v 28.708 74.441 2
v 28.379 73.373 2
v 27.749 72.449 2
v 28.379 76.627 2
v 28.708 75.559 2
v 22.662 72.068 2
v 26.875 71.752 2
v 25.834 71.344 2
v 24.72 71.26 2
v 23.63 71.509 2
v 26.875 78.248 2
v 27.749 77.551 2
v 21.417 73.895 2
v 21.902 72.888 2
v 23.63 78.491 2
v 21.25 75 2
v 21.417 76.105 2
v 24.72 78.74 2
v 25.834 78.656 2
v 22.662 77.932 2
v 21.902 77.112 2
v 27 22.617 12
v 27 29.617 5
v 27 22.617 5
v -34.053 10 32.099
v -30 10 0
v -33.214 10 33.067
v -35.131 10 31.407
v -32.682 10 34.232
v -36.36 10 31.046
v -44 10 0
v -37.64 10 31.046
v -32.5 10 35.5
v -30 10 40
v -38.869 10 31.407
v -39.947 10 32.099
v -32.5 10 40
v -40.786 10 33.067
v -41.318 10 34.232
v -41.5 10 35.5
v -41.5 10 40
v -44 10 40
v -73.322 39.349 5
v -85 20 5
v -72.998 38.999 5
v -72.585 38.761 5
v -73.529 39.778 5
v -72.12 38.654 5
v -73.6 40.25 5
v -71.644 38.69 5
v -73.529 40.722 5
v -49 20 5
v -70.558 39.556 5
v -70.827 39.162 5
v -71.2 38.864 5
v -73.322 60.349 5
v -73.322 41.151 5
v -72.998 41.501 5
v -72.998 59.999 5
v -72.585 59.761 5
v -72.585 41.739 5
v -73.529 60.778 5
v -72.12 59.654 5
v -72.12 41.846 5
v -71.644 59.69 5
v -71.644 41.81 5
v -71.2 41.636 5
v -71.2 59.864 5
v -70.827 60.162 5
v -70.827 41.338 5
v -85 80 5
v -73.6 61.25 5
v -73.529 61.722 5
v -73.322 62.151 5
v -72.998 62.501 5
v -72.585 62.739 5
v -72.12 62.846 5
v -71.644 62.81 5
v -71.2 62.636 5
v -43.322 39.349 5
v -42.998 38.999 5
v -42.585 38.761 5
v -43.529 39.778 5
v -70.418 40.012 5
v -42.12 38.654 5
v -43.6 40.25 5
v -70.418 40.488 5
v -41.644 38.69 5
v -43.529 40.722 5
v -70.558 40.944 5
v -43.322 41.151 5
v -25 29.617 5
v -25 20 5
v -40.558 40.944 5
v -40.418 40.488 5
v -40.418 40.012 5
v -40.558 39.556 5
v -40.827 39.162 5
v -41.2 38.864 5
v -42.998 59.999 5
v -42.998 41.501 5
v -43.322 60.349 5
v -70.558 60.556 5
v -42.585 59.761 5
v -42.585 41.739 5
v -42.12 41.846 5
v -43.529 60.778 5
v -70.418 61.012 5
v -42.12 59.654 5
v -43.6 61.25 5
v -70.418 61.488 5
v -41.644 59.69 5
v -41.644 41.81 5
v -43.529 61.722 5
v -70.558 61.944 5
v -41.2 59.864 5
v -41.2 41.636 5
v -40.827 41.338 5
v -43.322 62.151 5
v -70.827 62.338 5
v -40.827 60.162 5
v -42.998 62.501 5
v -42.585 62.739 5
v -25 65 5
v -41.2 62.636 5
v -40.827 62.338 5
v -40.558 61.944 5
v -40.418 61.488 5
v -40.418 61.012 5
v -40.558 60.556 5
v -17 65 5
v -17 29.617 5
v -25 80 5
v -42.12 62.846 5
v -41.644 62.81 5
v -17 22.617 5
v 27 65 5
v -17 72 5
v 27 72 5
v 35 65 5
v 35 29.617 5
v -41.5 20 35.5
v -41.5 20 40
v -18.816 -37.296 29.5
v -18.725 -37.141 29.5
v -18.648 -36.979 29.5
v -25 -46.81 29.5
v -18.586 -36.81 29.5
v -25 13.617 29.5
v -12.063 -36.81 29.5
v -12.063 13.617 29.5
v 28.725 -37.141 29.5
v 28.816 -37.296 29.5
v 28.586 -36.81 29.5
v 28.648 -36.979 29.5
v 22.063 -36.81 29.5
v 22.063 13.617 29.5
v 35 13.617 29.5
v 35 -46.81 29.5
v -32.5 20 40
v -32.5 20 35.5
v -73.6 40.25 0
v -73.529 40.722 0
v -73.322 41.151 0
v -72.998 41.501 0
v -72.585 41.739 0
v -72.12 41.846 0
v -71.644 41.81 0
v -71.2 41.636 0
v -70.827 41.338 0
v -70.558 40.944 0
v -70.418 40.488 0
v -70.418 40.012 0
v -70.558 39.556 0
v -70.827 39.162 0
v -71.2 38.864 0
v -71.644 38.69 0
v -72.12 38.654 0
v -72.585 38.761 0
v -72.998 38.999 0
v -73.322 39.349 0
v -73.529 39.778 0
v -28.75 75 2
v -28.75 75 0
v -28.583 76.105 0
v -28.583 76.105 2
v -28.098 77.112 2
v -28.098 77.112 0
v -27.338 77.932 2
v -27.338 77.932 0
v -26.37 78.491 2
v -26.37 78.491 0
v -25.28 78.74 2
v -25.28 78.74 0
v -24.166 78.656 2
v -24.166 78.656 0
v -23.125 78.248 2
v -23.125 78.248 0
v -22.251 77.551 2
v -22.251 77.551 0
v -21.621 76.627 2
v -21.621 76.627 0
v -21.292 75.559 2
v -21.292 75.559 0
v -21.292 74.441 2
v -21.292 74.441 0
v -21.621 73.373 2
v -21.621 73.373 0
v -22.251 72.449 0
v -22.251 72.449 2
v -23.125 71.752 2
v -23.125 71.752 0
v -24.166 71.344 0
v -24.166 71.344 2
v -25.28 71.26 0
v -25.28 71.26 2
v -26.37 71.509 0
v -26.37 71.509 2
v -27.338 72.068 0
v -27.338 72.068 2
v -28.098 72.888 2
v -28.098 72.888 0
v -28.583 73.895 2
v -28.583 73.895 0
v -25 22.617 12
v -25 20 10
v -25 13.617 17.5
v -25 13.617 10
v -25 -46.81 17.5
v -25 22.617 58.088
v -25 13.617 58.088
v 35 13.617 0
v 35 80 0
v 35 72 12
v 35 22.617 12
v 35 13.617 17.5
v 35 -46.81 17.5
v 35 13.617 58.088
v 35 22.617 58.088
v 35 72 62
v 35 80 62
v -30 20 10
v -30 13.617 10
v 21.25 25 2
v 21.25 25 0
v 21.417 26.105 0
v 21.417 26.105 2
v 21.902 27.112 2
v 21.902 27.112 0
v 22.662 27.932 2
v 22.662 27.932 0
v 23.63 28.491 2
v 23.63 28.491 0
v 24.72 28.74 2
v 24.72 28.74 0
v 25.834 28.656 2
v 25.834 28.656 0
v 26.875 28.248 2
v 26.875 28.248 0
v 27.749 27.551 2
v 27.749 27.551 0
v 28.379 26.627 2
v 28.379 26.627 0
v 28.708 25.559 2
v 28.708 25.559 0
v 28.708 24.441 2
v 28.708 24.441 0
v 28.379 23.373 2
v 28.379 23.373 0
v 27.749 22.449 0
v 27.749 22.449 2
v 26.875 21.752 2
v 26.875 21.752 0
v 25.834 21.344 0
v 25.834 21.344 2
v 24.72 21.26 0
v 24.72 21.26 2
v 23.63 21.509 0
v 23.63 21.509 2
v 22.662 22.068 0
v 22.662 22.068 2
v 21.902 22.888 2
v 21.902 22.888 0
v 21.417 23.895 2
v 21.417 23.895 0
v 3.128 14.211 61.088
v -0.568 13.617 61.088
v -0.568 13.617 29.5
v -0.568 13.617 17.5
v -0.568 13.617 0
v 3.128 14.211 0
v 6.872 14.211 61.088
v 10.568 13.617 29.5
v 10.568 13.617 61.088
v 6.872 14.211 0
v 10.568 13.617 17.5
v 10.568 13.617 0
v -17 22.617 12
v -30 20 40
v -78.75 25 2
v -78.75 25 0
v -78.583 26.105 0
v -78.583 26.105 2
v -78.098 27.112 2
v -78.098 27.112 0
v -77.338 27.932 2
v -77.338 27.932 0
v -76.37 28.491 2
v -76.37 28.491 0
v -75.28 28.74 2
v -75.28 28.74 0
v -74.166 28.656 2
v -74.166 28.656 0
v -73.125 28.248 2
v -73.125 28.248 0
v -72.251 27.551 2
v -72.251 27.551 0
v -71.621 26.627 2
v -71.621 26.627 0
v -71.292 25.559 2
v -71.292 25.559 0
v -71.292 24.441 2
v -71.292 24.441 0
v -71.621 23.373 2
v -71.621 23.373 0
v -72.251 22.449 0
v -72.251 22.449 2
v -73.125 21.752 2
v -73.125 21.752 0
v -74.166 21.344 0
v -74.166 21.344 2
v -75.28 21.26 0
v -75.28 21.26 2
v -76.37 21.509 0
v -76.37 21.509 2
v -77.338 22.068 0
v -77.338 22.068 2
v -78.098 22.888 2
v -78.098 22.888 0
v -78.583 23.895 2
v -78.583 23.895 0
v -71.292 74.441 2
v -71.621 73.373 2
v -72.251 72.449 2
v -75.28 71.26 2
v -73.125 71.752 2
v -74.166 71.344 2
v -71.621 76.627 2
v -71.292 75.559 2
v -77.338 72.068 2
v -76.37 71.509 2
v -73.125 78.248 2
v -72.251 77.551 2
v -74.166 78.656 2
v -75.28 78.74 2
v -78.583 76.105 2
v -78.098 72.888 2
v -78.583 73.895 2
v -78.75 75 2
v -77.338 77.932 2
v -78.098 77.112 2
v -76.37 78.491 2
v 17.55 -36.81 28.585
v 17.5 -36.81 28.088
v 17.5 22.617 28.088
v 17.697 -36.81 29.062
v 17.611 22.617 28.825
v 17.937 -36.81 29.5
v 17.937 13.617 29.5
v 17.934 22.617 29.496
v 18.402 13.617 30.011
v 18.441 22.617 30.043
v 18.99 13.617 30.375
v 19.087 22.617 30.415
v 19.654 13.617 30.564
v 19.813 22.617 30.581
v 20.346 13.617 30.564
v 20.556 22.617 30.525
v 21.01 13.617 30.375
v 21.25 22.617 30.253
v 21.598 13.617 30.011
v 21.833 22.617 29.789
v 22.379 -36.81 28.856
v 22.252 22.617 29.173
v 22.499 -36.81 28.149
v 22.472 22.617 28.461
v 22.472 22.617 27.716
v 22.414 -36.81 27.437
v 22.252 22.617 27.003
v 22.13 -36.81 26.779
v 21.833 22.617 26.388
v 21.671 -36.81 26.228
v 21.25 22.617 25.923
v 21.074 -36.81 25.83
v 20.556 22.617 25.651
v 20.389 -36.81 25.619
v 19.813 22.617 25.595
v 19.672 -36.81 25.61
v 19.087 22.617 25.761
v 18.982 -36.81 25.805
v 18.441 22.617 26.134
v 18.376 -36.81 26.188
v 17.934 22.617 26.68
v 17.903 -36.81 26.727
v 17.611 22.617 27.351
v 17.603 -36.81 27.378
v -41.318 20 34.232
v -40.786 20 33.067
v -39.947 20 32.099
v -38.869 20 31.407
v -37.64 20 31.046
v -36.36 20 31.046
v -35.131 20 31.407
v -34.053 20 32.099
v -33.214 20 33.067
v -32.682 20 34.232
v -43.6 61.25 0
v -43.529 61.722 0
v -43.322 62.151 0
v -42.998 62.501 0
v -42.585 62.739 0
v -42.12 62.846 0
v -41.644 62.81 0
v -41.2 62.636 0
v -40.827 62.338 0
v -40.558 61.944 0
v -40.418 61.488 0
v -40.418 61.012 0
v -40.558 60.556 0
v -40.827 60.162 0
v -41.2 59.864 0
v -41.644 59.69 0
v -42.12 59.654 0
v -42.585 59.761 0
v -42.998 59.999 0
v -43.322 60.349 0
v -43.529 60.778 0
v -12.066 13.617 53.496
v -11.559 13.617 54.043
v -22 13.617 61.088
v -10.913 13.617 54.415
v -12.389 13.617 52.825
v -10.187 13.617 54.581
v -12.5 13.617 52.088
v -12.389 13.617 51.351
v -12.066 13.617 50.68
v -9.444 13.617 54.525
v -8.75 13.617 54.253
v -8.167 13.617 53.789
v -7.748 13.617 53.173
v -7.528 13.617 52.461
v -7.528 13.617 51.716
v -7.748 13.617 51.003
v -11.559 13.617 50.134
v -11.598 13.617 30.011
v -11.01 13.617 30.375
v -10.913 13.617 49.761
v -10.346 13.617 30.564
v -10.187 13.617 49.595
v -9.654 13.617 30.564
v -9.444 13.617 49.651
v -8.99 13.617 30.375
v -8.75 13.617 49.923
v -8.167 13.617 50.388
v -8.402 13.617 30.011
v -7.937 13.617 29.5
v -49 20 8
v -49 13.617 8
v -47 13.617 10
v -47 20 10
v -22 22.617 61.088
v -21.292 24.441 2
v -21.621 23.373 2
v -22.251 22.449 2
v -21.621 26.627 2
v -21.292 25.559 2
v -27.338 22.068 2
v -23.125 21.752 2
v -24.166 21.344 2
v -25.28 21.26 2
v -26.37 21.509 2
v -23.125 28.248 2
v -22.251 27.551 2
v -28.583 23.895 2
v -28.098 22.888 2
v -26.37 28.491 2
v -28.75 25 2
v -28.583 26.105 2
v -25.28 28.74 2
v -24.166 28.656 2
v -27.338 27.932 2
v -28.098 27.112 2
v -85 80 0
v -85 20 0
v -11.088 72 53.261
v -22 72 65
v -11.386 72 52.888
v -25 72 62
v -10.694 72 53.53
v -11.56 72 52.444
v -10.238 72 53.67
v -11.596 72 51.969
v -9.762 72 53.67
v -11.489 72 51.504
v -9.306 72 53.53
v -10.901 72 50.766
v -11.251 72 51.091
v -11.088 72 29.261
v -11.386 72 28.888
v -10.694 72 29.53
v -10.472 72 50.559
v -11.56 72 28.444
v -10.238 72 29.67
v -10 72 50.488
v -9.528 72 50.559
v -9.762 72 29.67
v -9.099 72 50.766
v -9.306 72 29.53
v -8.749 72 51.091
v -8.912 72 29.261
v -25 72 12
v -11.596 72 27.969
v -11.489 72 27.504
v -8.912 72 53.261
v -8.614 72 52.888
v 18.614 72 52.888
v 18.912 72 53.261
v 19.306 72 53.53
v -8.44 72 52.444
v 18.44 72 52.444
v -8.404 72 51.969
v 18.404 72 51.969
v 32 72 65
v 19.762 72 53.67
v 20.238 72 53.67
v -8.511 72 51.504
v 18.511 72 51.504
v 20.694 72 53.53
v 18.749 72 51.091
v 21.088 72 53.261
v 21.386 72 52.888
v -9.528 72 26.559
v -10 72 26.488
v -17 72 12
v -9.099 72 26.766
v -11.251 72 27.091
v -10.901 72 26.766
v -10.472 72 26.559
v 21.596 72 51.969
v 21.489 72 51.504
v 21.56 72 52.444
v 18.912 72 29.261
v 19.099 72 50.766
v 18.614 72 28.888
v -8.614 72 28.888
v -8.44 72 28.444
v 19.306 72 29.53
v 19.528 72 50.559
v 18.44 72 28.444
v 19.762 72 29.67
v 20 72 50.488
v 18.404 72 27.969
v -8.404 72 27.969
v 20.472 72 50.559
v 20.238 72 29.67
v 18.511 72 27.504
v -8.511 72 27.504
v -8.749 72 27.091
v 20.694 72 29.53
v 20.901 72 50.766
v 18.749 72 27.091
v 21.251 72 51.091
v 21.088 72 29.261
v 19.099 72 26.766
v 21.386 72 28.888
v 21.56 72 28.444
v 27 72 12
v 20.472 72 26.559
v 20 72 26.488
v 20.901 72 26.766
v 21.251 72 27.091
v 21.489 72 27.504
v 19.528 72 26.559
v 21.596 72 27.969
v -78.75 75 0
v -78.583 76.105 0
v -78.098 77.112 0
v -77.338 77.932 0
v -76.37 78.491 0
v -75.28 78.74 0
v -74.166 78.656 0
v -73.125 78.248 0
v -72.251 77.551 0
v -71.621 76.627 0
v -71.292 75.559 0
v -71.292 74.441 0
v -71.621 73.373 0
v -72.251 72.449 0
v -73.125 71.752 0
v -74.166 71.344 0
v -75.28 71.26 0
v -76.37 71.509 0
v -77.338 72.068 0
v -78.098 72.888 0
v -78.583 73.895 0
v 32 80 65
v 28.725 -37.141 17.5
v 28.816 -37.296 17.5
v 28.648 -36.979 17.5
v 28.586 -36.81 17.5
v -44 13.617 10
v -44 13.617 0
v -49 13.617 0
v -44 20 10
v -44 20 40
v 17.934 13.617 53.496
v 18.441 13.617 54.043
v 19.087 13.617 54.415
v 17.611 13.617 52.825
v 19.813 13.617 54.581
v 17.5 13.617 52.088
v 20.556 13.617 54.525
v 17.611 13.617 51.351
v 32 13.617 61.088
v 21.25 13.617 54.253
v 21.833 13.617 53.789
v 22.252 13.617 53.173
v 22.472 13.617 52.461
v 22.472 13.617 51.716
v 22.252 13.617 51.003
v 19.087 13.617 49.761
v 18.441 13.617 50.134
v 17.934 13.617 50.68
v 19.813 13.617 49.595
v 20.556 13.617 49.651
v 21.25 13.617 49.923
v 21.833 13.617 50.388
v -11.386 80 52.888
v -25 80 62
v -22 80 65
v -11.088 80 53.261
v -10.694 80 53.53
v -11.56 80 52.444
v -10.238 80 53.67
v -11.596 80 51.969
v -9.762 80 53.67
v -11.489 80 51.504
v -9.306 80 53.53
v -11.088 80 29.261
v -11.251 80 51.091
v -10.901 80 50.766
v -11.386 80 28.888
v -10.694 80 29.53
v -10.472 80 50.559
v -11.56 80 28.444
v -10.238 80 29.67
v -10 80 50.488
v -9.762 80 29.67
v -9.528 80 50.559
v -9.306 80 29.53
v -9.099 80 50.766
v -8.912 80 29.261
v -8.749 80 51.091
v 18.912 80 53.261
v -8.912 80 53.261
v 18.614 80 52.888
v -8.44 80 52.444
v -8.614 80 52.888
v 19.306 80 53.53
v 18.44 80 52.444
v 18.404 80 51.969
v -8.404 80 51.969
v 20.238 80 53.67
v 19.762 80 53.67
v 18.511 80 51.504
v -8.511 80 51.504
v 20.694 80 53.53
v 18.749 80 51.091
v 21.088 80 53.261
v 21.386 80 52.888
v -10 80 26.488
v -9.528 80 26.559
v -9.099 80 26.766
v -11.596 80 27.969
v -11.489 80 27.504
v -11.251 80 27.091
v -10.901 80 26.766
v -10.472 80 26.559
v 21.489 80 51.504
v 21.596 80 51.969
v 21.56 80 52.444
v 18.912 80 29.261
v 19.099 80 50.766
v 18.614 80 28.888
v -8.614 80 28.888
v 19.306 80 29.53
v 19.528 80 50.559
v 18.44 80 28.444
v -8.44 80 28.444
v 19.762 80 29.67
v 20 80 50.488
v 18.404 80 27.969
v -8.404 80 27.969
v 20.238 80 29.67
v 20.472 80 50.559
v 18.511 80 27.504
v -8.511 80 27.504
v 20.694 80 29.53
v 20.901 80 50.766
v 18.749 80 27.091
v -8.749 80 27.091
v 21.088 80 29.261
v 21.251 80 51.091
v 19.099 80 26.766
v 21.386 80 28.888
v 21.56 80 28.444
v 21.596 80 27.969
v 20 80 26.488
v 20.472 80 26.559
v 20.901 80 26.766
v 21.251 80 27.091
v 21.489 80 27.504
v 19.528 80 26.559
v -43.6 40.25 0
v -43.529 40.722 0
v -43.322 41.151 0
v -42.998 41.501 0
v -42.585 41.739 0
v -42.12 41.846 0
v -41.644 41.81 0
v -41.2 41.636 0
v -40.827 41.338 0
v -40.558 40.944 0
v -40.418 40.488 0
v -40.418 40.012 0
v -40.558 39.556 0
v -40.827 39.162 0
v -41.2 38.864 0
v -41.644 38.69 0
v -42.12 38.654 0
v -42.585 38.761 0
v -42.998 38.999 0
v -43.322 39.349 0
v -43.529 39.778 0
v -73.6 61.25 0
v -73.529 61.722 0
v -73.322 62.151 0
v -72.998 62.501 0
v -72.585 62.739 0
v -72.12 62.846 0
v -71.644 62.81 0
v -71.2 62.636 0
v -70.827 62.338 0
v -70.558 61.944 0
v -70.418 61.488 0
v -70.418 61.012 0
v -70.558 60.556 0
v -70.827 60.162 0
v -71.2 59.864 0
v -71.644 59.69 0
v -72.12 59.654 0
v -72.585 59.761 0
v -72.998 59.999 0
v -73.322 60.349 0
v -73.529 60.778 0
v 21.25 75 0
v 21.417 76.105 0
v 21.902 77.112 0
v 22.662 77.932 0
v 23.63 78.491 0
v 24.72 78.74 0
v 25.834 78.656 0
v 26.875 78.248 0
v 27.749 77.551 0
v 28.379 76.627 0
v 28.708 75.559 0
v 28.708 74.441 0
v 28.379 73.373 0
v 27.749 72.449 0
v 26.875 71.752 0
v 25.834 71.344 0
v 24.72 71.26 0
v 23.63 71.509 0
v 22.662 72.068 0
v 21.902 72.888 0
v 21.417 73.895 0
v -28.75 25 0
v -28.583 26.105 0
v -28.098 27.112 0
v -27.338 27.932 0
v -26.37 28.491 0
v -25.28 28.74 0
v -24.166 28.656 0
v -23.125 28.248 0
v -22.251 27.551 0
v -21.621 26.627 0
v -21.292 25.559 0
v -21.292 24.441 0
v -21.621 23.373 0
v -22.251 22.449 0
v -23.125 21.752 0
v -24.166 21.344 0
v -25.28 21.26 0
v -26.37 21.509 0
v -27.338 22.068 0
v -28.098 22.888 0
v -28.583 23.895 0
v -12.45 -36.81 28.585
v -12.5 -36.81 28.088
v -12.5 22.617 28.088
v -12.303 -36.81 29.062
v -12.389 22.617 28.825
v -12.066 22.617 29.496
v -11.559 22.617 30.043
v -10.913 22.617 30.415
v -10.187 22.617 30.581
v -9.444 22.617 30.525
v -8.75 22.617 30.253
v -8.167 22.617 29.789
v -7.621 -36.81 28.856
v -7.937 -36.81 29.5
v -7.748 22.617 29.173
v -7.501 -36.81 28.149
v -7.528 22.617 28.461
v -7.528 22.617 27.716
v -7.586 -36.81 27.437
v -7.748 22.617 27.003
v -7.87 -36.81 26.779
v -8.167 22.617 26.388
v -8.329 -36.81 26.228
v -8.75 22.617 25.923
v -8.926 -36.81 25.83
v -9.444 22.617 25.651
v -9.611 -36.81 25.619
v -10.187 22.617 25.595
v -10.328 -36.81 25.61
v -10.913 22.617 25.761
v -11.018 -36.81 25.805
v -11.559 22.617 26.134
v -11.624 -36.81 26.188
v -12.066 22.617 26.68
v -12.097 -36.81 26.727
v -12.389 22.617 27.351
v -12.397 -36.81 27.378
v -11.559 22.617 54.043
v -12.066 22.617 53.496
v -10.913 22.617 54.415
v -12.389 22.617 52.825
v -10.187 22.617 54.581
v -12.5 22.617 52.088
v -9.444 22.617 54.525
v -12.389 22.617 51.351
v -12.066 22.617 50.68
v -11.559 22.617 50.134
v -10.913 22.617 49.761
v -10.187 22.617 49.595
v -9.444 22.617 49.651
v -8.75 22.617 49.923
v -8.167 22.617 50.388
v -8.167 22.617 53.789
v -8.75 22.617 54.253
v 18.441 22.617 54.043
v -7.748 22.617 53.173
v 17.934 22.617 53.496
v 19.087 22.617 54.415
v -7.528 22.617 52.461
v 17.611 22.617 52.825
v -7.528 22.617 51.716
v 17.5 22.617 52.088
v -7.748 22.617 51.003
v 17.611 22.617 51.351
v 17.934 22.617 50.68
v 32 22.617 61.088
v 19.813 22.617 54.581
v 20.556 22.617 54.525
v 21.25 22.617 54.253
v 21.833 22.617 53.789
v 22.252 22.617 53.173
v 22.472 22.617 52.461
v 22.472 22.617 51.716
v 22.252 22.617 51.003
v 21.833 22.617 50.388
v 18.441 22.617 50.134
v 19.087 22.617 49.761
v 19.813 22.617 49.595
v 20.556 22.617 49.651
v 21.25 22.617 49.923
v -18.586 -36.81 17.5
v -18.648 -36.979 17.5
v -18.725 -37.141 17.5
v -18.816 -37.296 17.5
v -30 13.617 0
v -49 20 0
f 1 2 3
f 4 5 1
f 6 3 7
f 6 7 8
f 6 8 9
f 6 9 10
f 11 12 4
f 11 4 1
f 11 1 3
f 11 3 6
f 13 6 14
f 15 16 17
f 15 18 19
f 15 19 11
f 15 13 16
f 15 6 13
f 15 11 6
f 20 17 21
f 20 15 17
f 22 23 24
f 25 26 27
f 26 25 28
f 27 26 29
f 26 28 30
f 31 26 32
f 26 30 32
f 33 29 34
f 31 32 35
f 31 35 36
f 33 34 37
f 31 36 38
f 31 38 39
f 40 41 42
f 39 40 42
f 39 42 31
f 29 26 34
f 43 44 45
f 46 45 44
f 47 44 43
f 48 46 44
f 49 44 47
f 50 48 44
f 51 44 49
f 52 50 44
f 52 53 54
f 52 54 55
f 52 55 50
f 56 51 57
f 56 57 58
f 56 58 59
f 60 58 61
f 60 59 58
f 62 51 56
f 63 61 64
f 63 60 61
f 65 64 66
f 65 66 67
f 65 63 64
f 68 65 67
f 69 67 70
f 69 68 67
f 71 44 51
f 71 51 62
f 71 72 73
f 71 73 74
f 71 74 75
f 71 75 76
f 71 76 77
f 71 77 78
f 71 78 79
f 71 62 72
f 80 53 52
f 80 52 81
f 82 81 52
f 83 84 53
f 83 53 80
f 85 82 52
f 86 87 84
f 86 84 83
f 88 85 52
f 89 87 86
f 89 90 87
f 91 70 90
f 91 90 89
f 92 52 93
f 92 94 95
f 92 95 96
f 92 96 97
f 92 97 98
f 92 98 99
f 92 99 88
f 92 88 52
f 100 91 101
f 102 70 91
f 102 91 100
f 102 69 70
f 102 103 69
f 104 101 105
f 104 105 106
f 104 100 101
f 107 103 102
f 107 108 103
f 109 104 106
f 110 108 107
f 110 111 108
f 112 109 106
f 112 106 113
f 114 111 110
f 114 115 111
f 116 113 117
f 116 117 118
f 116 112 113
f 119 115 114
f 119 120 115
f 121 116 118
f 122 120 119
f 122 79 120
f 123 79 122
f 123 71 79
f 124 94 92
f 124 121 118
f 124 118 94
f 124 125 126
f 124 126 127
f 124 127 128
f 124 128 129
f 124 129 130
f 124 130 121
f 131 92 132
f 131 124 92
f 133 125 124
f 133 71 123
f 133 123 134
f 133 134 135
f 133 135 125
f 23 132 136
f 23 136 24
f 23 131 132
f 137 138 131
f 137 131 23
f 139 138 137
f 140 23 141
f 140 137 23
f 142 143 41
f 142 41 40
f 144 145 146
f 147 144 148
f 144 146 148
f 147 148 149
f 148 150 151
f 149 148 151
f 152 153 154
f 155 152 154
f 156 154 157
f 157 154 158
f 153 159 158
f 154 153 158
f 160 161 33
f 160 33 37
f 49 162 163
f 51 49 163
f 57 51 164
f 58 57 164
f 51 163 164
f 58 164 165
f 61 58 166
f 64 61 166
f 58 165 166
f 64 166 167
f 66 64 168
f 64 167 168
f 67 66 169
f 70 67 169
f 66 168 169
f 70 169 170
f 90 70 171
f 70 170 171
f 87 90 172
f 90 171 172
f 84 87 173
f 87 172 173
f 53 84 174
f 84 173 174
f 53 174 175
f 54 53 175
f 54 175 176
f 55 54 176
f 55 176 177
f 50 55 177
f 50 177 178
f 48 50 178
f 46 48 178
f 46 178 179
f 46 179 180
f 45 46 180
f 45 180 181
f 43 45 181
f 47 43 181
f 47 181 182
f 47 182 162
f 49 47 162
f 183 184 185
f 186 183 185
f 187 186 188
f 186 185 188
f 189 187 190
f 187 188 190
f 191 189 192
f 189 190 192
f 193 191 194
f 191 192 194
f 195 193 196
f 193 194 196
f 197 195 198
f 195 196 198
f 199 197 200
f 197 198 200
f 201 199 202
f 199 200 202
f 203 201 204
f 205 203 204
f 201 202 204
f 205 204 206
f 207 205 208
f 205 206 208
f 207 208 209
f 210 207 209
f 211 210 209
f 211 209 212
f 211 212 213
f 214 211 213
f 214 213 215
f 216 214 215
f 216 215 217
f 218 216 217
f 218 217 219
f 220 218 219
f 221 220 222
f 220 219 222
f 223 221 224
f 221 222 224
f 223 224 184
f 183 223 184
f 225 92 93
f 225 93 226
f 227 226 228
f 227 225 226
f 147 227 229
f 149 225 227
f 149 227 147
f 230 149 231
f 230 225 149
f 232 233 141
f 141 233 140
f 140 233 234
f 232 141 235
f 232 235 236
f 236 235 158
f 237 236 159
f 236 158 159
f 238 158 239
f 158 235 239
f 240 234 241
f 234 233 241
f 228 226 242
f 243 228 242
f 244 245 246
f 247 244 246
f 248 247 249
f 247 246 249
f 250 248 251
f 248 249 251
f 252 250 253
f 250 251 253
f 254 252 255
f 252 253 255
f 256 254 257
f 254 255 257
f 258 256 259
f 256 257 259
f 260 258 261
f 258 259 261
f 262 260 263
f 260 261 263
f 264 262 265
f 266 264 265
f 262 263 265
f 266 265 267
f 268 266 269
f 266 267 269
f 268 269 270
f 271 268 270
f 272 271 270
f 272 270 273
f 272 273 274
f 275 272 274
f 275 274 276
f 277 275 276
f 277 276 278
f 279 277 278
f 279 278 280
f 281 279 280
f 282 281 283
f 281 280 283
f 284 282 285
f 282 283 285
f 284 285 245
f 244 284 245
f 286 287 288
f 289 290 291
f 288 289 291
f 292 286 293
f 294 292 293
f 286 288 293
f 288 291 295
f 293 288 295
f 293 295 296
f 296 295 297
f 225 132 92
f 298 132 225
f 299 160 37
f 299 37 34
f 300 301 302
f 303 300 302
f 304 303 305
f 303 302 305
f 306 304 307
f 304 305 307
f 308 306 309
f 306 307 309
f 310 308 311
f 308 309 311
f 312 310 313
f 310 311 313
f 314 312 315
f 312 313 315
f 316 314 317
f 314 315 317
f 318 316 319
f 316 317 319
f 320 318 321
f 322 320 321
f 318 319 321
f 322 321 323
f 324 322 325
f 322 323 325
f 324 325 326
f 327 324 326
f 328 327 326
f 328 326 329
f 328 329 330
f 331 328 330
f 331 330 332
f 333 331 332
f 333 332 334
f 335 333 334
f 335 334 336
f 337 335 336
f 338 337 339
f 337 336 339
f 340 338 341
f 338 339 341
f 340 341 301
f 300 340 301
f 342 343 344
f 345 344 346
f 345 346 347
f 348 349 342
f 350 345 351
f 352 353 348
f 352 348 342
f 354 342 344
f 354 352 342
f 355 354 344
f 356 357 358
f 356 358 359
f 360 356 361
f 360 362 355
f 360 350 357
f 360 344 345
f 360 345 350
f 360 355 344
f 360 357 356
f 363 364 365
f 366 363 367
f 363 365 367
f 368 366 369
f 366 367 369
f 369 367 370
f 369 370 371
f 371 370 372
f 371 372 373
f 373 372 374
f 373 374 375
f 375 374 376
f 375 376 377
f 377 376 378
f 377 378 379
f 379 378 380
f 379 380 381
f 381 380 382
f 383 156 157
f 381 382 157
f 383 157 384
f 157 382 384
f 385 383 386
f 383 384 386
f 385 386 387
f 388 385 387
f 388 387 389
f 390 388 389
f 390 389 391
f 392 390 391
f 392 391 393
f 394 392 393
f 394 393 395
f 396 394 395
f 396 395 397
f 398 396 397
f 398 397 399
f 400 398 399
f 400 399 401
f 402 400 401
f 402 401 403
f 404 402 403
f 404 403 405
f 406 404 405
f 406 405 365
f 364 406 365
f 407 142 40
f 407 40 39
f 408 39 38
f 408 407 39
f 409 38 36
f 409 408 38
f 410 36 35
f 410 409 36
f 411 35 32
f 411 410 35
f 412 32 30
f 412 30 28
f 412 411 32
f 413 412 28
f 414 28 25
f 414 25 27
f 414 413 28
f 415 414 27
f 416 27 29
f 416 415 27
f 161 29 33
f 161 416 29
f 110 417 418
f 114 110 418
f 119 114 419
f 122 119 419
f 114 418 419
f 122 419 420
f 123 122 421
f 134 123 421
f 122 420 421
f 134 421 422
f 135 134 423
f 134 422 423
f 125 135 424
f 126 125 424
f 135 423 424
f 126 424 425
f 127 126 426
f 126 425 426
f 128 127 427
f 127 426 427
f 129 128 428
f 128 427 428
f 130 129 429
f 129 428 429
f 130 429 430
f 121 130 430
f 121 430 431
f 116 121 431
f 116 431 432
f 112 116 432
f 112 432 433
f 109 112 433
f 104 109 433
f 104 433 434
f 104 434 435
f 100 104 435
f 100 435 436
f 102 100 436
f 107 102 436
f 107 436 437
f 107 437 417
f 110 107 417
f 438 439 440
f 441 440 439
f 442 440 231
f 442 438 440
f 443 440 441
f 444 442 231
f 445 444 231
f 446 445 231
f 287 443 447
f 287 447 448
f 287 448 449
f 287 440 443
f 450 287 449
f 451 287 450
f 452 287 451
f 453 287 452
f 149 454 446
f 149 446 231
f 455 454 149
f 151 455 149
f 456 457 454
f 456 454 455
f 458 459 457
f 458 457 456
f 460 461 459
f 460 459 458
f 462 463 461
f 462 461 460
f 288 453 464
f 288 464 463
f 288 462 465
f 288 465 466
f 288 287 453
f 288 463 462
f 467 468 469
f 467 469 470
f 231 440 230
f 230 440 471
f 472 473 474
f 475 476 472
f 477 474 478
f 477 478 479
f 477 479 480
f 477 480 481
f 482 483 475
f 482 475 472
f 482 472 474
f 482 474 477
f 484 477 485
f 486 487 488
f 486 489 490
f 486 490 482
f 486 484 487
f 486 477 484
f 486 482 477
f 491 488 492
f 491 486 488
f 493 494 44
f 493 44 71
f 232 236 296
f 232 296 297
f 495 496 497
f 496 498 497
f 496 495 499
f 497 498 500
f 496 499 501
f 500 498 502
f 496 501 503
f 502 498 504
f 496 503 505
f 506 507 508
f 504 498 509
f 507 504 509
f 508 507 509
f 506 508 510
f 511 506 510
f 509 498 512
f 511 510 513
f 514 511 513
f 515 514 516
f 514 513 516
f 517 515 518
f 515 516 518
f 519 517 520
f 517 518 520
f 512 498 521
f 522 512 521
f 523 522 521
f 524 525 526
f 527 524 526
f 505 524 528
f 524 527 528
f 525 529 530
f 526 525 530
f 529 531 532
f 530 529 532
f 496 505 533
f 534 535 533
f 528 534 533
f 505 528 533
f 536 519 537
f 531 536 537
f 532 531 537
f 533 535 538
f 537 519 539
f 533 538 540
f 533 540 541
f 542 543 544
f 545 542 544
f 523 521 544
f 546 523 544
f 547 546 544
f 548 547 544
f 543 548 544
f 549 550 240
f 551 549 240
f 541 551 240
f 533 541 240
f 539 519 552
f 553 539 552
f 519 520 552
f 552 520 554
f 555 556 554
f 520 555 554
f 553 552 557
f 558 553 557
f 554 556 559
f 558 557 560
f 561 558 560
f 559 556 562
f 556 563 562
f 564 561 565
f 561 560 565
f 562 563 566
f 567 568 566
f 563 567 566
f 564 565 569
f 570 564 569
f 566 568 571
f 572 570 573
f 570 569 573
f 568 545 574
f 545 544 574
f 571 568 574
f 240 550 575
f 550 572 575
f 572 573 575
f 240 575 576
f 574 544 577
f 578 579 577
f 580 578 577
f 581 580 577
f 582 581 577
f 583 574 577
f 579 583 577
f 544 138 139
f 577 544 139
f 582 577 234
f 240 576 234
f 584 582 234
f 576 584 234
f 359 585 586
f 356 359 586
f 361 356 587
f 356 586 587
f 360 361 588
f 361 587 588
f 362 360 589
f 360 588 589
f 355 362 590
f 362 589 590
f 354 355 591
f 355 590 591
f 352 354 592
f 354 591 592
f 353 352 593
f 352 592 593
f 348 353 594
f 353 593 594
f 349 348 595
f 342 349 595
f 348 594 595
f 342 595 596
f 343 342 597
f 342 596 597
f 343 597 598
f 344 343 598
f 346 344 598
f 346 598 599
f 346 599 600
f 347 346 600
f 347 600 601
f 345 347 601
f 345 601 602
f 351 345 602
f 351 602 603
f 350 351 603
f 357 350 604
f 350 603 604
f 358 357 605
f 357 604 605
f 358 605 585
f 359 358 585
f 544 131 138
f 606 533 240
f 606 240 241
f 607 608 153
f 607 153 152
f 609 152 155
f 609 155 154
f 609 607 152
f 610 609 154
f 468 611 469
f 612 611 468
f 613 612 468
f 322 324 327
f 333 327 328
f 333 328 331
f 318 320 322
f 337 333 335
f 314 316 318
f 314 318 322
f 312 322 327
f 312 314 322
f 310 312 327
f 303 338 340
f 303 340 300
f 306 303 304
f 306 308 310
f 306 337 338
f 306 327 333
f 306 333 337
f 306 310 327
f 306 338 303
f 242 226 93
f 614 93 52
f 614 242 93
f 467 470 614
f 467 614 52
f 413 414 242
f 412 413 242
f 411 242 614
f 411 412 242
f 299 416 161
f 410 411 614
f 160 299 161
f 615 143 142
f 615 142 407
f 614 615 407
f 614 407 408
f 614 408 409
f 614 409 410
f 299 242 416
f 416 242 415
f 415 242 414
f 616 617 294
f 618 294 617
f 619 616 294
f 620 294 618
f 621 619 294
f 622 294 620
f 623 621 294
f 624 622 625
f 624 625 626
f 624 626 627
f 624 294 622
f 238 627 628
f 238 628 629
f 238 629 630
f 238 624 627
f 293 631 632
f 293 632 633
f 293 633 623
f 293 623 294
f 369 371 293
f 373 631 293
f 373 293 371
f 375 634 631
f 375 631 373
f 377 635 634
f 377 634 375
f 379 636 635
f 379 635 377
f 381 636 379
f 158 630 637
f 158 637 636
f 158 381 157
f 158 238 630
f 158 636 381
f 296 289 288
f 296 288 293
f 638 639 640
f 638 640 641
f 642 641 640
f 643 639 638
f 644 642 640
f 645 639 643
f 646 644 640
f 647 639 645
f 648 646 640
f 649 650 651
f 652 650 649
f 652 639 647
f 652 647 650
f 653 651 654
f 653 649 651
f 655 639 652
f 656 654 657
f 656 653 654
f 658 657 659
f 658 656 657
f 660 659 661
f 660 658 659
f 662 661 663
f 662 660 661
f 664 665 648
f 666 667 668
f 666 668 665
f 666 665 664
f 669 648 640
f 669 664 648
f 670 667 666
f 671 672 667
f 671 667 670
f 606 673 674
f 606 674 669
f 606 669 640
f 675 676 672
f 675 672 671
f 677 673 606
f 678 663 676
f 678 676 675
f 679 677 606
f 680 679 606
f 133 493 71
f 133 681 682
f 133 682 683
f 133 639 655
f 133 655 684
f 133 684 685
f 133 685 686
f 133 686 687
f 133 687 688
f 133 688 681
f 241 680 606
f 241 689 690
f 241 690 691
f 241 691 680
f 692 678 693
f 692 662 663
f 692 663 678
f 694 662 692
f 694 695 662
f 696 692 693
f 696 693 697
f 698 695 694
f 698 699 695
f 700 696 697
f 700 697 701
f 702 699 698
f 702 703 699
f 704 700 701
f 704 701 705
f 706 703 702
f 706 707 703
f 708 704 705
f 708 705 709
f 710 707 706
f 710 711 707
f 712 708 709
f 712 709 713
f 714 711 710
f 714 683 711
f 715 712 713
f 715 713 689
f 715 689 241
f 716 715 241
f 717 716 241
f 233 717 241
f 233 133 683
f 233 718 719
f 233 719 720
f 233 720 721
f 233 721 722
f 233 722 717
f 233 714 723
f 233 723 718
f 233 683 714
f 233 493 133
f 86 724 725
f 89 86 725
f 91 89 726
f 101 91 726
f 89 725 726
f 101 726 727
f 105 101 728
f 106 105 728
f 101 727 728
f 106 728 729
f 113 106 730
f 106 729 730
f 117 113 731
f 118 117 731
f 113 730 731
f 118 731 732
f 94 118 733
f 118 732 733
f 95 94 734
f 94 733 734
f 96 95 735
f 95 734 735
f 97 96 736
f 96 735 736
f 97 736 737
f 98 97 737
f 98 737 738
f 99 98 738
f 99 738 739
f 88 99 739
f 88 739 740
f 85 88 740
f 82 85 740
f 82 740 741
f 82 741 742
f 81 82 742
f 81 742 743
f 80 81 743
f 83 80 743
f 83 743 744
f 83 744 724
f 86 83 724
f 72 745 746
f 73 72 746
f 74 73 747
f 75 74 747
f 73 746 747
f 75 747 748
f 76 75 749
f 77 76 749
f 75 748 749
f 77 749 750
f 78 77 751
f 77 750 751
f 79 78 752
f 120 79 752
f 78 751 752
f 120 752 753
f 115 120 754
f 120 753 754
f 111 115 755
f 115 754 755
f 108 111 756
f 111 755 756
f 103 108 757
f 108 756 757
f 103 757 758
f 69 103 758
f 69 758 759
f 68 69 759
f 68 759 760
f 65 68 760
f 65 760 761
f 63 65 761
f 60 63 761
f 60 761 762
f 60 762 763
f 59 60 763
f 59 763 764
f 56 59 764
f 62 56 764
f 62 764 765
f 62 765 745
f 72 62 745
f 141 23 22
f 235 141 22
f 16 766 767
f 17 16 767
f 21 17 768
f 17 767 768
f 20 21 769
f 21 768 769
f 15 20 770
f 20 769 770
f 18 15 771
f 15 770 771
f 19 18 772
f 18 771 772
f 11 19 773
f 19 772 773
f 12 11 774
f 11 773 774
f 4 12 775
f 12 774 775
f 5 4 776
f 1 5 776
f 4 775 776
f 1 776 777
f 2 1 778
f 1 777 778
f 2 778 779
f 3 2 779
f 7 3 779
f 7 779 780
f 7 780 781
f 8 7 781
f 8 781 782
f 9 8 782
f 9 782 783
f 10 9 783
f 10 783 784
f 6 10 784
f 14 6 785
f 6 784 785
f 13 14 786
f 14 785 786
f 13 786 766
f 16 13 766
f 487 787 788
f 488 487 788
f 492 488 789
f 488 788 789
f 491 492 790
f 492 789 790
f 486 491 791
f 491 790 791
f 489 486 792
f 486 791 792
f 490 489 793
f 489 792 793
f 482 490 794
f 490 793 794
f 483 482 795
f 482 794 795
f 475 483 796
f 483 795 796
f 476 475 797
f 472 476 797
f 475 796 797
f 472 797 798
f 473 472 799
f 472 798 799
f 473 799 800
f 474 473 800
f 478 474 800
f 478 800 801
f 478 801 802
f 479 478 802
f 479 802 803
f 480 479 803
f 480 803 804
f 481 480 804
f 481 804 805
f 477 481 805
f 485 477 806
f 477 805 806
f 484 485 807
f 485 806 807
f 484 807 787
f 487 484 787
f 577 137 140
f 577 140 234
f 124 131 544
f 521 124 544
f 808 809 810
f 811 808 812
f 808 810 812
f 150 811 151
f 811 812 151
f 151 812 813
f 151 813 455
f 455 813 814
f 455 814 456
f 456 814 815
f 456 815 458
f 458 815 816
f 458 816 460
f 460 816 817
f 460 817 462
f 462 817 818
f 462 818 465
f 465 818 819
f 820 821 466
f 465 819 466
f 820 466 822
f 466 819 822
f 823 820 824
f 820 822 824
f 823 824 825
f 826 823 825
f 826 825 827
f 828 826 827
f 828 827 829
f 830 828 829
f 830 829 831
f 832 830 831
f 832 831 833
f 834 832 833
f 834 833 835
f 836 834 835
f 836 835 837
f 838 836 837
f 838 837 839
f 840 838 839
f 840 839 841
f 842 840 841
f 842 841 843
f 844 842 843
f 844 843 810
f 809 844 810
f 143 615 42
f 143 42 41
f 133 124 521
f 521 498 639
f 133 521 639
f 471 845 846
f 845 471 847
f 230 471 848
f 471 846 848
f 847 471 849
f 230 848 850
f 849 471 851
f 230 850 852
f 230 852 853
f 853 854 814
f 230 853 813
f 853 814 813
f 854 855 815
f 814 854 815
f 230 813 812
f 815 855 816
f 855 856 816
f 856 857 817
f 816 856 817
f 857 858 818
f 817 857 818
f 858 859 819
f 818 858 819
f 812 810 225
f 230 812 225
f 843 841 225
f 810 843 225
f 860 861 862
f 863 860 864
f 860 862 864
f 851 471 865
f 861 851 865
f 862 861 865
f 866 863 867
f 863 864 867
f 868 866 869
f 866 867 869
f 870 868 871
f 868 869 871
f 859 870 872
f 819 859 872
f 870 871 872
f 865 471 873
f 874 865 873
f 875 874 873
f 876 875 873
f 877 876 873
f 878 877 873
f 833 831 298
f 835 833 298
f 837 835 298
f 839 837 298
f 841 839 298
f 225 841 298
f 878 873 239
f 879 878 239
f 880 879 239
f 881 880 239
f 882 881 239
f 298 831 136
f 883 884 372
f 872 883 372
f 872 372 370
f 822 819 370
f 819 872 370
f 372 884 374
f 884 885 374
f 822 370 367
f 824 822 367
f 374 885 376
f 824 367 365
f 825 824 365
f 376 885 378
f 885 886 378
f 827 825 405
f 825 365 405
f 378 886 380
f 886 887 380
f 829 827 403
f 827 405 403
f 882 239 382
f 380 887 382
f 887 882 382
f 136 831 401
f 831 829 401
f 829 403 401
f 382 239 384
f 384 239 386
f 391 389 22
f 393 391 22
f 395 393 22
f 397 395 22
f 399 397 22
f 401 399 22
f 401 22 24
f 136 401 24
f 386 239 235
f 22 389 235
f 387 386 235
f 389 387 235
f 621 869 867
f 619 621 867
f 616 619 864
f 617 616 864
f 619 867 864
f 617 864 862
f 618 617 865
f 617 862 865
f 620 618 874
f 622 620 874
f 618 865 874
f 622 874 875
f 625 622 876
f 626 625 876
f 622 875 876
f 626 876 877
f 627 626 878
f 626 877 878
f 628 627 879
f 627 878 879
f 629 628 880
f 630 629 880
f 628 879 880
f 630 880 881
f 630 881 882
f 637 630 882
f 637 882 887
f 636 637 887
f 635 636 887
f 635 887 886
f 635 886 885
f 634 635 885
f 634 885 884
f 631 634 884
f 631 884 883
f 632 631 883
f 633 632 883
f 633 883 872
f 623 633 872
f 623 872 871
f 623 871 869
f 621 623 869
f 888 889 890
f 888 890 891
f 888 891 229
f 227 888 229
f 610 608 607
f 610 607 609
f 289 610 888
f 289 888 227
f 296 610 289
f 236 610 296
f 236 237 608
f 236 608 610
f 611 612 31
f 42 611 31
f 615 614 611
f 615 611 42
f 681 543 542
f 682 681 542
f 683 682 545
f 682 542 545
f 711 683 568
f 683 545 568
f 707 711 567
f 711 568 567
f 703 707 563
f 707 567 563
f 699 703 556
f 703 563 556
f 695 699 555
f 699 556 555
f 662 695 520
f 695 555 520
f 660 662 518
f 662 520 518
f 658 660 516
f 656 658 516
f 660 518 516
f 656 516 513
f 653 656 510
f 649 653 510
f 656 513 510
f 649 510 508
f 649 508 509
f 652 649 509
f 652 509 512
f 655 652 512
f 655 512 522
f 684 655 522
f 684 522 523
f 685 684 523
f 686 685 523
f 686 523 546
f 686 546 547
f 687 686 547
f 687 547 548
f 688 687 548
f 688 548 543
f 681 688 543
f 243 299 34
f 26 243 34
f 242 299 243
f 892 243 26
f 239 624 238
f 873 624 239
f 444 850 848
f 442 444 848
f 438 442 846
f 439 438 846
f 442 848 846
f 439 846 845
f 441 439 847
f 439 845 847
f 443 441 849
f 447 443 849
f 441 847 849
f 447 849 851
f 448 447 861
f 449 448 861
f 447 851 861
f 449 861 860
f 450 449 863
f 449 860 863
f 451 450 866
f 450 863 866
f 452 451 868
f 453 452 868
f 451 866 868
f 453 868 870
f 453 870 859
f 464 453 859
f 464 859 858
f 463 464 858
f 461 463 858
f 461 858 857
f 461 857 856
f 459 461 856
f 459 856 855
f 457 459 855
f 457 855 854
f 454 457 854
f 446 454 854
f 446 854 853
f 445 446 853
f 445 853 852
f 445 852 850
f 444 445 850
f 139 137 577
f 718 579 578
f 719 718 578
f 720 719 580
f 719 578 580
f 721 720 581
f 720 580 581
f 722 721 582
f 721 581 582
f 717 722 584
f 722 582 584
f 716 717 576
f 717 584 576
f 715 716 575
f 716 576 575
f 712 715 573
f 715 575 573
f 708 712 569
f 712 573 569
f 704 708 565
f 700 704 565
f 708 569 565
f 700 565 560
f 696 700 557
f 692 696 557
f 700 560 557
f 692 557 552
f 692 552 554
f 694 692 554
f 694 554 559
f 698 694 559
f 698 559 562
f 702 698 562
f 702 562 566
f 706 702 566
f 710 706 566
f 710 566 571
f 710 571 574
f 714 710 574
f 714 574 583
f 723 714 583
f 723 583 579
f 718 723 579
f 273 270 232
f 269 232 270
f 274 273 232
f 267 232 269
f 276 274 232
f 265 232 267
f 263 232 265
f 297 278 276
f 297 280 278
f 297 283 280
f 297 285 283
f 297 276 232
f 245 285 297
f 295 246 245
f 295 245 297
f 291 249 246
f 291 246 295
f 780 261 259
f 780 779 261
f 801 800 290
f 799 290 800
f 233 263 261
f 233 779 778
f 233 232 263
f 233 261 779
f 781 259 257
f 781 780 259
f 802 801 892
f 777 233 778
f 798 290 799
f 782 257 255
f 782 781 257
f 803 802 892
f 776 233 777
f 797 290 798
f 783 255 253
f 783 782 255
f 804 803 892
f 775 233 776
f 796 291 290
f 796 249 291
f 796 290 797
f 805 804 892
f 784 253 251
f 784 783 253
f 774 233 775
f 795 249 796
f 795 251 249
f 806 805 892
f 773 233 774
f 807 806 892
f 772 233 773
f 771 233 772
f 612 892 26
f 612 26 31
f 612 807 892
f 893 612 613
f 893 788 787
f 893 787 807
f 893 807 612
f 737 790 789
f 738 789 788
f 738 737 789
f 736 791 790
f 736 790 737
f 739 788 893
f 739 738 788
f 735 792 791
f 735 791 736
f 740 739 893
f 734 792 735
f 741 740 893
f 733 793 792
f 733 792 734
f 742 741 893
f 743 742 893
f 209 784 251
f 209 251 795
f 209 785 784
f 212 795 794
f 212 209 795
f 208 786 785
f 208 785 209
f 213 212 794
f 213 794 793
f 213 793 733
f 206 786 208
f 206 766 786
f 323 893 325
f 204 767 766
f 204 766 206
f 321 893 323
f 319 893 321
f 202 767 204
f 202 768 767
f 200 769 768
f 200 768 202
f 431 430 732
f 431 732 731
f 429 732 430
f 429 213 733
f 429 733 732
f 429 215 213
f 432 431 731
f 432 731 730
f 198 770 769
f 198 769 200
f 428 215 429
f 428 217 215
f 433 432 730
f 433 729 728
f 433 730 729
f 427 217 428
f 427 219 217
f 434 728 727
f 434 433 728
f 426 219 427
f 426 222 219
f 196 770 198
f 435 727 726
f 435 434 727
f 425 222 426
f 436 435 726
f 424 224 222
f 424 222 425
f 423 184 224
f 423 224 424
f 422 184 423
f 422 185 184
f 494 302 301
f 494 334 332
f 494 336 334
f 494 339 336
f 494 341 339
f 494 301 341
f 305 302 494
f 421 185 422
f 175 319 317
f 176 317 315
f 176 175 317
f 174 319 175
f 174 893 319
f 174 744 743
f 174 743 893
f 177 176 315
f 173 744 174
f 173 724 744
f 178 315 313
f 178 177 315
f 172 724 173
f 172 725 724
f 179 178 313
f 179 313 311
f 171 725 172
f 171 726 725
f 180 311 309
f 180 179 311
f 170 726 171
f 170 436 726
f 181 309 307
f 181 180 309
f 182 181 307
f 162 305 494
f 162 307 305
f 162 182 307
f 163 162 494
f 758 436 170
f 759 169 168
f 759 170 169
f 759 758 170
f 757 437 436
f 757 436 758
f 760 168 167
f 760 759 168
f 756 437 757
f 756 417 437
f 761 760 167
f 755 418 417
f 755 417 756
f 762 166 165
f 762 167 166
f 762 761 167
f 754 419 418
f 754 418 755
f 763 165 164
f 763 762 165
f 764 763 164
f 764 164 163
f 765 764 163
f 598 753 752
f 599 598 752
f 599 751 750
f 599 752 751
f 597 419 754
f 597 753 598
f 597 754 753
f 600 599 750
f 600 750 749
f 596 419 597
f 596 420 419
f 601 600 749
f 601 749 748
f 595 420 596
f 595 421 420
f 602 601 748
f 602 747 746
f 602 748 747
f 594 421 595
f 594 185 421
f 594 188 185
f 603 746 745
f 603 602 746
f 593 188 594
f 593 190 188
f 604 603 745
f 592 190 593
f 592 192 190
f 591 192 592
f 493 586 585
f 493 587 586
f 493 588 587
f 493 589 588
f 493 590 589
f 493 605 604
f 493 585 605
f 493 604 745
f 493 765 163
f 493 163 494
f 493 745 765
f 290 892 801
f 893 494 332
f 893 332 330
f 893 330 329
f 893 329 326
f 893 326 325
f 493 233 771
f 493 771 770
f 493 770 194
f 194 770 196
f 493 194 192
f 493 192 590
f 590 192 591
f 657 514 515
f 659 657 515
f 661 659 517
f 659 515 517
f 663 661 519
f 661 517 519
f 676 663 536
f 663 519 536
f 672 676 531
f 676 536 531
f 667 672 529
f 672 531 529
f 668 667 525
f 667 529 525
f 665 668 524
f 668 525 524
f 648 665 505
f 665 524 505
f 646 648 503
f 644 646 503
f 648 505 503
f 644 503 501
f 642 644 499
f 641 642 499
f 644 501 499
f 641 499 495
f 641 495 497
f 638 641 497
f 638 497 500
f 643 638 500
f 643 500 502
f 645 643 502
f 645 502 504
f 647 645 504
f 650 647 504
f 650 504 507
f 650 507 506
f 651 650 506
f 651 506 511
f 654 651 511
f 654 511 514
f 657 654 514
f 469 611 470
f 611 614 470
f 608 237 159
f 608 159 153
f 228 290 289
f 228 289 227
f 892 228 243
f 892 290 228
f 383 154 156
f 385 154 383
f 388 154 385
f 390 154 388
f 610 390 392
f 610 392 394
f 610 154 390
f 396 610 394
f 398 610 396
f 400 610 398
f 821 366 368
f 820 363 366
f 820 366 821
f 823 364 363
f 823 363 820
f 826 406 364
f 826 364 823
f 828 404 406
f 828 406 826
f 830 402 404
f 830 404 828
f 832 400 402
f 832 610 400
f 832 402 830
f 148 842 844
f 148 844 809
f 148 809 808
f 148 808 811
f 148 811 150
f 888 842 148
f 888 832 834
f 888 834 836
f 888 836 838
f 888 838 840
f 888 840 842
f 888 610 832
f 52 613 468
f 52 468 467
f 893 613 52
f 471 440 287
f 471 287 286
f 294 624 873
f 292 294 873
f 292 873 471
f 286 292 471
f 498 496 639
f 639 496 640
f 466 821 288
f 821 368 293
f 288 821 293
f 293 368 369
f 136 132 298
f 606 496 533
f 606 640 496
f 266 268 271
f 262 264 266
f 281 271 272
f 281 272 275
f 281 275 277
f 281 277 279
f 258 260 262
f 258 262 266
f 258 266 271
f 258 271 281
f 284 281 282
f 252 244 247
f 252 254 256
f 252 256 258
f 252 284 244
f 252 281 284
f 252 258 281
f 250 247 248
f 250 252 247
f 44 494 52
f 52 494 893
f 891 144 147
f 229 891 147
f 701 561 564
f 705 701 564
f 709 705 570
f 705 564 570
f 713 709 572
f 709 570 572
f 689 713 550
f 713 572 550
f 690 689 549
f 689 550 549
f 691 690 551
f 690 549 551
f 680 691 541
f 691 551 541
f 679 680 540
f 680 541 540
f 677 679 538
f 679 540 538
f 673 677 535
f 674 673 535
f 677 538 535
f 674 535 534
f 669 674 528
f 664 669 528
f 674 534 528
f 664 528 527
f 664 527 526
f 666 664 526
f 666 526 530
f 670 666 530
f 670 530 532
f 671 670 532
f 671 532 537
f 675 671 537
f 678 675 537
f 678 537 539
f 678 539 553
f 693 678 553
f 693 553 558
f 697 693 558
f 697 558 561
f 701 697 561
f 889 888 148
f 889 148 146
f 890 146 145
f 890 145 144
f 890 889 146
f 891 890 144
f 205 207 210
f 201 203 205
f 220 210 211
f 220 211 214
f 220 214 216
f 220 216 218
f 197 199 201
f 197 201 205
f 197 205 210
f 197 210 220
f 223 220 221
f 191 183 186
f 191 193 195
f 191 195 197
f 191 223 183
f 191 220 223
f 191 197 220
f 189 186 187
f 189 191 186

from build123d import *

# Parameters (mm, degrees)
SKETCH_1_W               = 120
SKETCH_1_H               = 60
EXTRUDE_1_DEPTH          = 5
SKETCH_3_W               = 60
SKETCH_3_H               = 8
EXTRUDE_3_DEPTH          = 60
SKETCH_4_W               = 61.088110118
SKETCH_4_H               = 9
EXTRUDE_4_DEPTH          = 60
SKETCH_6_R               = 23.5
CUT_EXTRUDE_1_DEPTH      = 134.603892159
EXTRUDE_5_DEPTH          = 50
SKETCH_8_W               = 20.5
SKETCH_8_H               = 60.427303984
SKETCH_8_W_2             = 17.5
CUT_EXTRUDE_2_DEPTH      = 60
EXTRUDE_6_DEPTH          = 10
SKETCH_11_R              = 1.6
CUT_EXTRUDE_3_DEPTH      = 160.893337757
SKETCH_12_R              = 1.6
CUT_EXTRUDE_4_DEPTH      = 134.603892159
RIB_1_REACH              = 160.193
SKETCH_13_WALL_W         = 328.285335328
SKETCH_13_WALL_H         = 8
MIRROR_2_COPY_1_REACH    = 160.193
MIRROR_2_COPY_1_SKETCH_W = 328.285335328
MIRROR_2_COPY_1_SKETCH_H = 8
SKETCH_15_W              = 5
SKETCH_15_H              = 6.382962656
EXTRUDE_7_DEPTH          = 10
CHAMFER_2_SIZE           = 2
CHAMFER_3_SIZE           = 3
SKETCH_16_R              = 2.5
CUT_EXTRUDE_5_DEPTH      = 128.554500267
SKETCH_18_R              = 3.75
CUT_EXTRUDE_7_DEPTH      = 2


with BuildPart() as part:
    # 草图1 → 凸台-拉伸1 (new body)
    with BuildSketch(Plane.XY):
        with Locations((-25, 50)):
            Rectangle(SKETCH_1_W, SKETCH_1_H)
    extrude(amount=EXTRUDE_1_DEPTH)

    # 草图3 → 凸台-拉伸3 (add)
    with BuildSketch(Plane.XY.offset(5)):
        with Locations((5, 76)):
            Rectangle(SKETCH_3_W, SKETCH_3_H)
    extrude(amount=EXTRUDE_3_DEPTH)

    # 草图4 → 凸台-拉伸4 (add)
    with BuildSketch(Plane(origin=(35, 0, 0), x_dir=(0, 0, -1), z_dir=(1, 0, 0))):
        with Locations((-30.544055059, 18.117037344)):
            Rectangle(SKETCH_4_W, SKETCH_4_H)
    extrude(amount=-EXTRUDE_4_DEPTH)

    # 草图6 → 切除-拉伸1 (cut, through all)
    with BuildSketch(Plane(origin=(0, 0, 0), x_dir=(-1, 0, 0), z_dir=(0, 0, -1))):
        with Locations((-5, -9.213883343)):
            Circle(SKETCH_6_R)
    extrude(amount=-CUT_EXTRUDE_1_DEPTH, mode=Mode.SUBTRACT)

    # 草图7 → 凸台-拉伸5 (add)
    with BuildSketch(Plane(origin=(0, 0, 0), x_dir=(-1, 0, 0), z_dir=(0, 0, -1))):
        with BuildLine():
            Line((25, 13.617037344), (-35, 13.617037344))
            Line((-35, 13.617037344), (-35, -46.81026664))
            Line((-35, -46.81026664), (-28.815961295, -37.29636094))
            ThreePointArc((-28.815961295, -37.29636094), (-28.684669265, -37.061070002), (-28.586195427, -36.81026664))
            Line((-28.586195427, -36.81026664), (18.586195427, -36.81026664))
            ThreePointArc((18.586195427, -36.81026664), (18.684669265, -37.061070002), (18.815961295, -37.29636094))
            Line((18.815961295, -37.29636094), (25, -46.81026664))
            Line((25, -46.81026664), (25, 13.617037344))
        make_face()
    extrude(amount=-EXTRUDE_5_DEPTH)

    # 草图8 → 切除-拉伸2 (cut)
    with BuildSketch(Plane(origin=(35, 0, 0), x_dir=(0, 0, -1), z_dir=(1, 0, 0))):
        with Locations((-39.75, -16.596614648)):
            Rectangle(SKETCH_8_W, SKETCH_8_H)
        with Locations((-8.75, -16.596614648)):
            Rectangle(SKETCH_8_W_2, SKETCH_8_H)
    extrude(amount=-CUT_EXTRUDE_2_DEPTH, mode=Mode.SUBTRACT)

    # 草图9 → 凸台-拉伸6 (add)
    with BuildSketch(Plane.XZ.offset(-20)):
        with BuildLine():
            Line((-32.5, 0), (-41.5, 0))
            Line((-41.5, 0), (-44, 0))
            Line((-44, 0), (-44, 40))
            Line((-44, 40), (-41.5, 40))
            Line((-41.5, 40), (-41.5, 35.5))
            ThreePointArc((-41.5, 35.5), (-37, 31), (-32.5, 35.5))
            Line((-32.5, 35.5), (-32.5, 40))
            Line((-32.5, 40), (-30, 40))
            Line((-30, 40), (-30, 0))
            Line((-30, 0), (-32.5, 0))
        make_face()
    extrude(amount=EXTRUDE_6_DEPTH)

    # 草图11 → 切除-拉伸3 (cut, through all)
    with BuildSketch(Plane(origin=(0, 72, 0), x_dir=(-1, 0, 0), z_dir=(0, -1, 0))):
        with Locations(Location((-20, -52.088110118, 0), (0, 0, 90))):
            Circle(SKETCH_11_R)
        with Locations(Location((10, -28.088110118, 0), (0, 0, 90))):
            Circle(SKETCH_11_R)
        with Locations(Location((-20, -28.088110118, 0), (0, 0, 90))):
            Circle(SKETCH_11_R)
        with Locations(Location((10, -52.088110118, 0), (0, 0, 90))):
            Circle(SKETCH_11_R)
    extrude(amount=-CUT_EXTRUDE_3_DEPTH, mode=Mode.SUBTRACT)

    # 草图12 → 切除-拉伸4 (cut, through all)
    with BuildSketch(Plane(origin=(0, 0, 0), x_dir=(-1, 0, 0), z_dir=(0, 0, -1))):
        with Locations((42, 40.25)):
            Circle(SKETCH_12_R)
        with Locations((42, 61.25)):
            Circle(SKETCH_12_R)
        with Locations((72, 40.25)):
            Circle(SKETCH_12_R)
        with Locations((72, 61.25)):
            Circle(SKETCH_12_R)
    extrude(amount=-CUT_EXTRUDE_4_DEPTH, mode=Mode.SUBTRACT)

    # 草图13 wall → 筋1 (add, up to next)
    with BuildSketch(Plane(origin=(35, 68.5, 8.5), x_dir=(0, 0.707106781187, 0.707106781187), z_dir=(0, -0.707106781187, 0.707106781187)), mode=Mode.PRIVATE) as rib_1_sk1:
        with Locations((0, 4)):
            Rectangle(SKETCH_13_WALL_W, SKETCH_13_WALL_H)
    rib_1_tool1 = extrude(rib_1_sk1.sketch, amount=-RIB_1_REACH, mode=Mode.PRIVATE) - part.part
    rib_1 = rib_1_tool1.solids().sort_by_distance((35, 68.5, 8.5))[0]
    add(rib_1)

    # 镜向1: 筋1 across plane
    add(rib_1.mirror(Plane(origin=(5, 0, 0), x_dir=(0, 0, 1), z_dir=(1, 0, 0))))

    # 镜向2: 筋1 across plane
    add(rib_1.mirror(Plane(origin=(0, 47.308518672, 0), x_dir=(0, 0, 1), z_dir=(0, -1, 0))))

    # 镜向2 copy 1 sketch → 镜向2 copy 1 (add, up to next)
    with BuildSketch(Plane(origin=(-25, 26.117037344, 8.5), x_dir=(0, -0.7071067811870001, 0.7071067811869999), z_dir=(0, 0.7071067811869999, 0.7071067811870001)), mode=Mode.PRIVATE) as mirror_2_copy_1_sk1:
        with Locations((0, 4)):
            Rectangle(MIRROR_2_COPY_1_SKETCH_W, MIRROR_2_COPY_1_SKETCH_H)
    mirror_2_copy_1_tool1 = extrude(mirror_2_copy_1_sk1.sketch, amount=-MIRROR_2_COPY_1_REACH, mode=Mode.PRIVATE) - part.part
    add(mirror_2_copy_1_tool1.solids().sort_by_distance((-25, 26.117037344, 8.5))[0])

    # 草图15 → 凸台-拉伸7 (add)
    with BuildSketch(Plane(origin=(0, 0, 0), x_dir=(-1, 0, 0), z_dir=(0, 0, -1))):
        with Locations((27.5, 16.808518672)):
            Rectangle(SKETCH_15_W, SKETCH_15_H)
        with Locations((46.5, 16.808518672)):
            Rectangle(SKETCH_15_W, SKETCH_15_H)
    extrude(amount=-EXTRUDE_7_DEPTH)

    # 倒角2
    chamfer_2_edges = [part.edges().sort_by_distance(p)[0] for p in [
        (-49, 16.808518672, 10),
    ]]
    chamfer(chamfer_2_edges, length=CHAMFER_2_SIZE)

    # 倒角3
    chamfer_3_edges = [part.edges().sort_by_distance(p)[0] for p in [
        (-25, 76, 65),
        (35, 76, 65),
        (35, 18.117037344, 61.088110118),
        (-25, 18.117037344, 61.088110118),
    ]]
    chamfer(chamfer_3_edges, length=CHAMFER_3_SIZE)

    # 草图16 → 切除-拉伸5 (cut, through all)
    with BuildSketch(Plane(origin=(0, 22.617037344, 0), x_dir=(1, 0, 0), z_dir=(0, 1, 0))):
        with Locations(Location((20, -52.088110118, 0), (0, 0, 180))):
            Circle(SKETCH_16_R)
        with Locations(Location((-10, -52.088110118, 0), (0, 0, 180))):
            Circle(SKETCH_16_R)
        with Locations(Location((-10, -28.088110118, 0), (0, 0, 180))):
            Circle(SKETCH_16_R)
        with Locations(Location((20, -28.088110118, 0), (0, 0, 180))):
            Circle(SKETCH_16_R)
    extrude(amount=-CUT_EXTRUDE_5_DEPTH, mode=Mode.SUBTRACT)

    # 草图18 → 切除-拉伸7 (cut)
    with BuildSketch(Plane(origin=(0, 0, 0), x_dir=(-1, 0, 0), z_dir=(0, 0, -1))):
        with Locations((75, 75)):
            Circle(SKETCH_18_R)
        with Locations((25, 75)):
            Circle(SKETCH_18_R)
        with Locations((-25, 75)):
            Circle(SKETCH_18_R)
        with Locations((-25, 25)):
            Circle(SKETCH_18_R)
        with Locations((25, 25)):
            Circle(SKETCH_18_R)
        with Locations((75, 25)):
            Circle(SKETCH_18_R)
    extrude(amount=-CUT_EXTRUDE_7_DEPTH, mode=Mode.SUBTRACT)


solid = part.part
